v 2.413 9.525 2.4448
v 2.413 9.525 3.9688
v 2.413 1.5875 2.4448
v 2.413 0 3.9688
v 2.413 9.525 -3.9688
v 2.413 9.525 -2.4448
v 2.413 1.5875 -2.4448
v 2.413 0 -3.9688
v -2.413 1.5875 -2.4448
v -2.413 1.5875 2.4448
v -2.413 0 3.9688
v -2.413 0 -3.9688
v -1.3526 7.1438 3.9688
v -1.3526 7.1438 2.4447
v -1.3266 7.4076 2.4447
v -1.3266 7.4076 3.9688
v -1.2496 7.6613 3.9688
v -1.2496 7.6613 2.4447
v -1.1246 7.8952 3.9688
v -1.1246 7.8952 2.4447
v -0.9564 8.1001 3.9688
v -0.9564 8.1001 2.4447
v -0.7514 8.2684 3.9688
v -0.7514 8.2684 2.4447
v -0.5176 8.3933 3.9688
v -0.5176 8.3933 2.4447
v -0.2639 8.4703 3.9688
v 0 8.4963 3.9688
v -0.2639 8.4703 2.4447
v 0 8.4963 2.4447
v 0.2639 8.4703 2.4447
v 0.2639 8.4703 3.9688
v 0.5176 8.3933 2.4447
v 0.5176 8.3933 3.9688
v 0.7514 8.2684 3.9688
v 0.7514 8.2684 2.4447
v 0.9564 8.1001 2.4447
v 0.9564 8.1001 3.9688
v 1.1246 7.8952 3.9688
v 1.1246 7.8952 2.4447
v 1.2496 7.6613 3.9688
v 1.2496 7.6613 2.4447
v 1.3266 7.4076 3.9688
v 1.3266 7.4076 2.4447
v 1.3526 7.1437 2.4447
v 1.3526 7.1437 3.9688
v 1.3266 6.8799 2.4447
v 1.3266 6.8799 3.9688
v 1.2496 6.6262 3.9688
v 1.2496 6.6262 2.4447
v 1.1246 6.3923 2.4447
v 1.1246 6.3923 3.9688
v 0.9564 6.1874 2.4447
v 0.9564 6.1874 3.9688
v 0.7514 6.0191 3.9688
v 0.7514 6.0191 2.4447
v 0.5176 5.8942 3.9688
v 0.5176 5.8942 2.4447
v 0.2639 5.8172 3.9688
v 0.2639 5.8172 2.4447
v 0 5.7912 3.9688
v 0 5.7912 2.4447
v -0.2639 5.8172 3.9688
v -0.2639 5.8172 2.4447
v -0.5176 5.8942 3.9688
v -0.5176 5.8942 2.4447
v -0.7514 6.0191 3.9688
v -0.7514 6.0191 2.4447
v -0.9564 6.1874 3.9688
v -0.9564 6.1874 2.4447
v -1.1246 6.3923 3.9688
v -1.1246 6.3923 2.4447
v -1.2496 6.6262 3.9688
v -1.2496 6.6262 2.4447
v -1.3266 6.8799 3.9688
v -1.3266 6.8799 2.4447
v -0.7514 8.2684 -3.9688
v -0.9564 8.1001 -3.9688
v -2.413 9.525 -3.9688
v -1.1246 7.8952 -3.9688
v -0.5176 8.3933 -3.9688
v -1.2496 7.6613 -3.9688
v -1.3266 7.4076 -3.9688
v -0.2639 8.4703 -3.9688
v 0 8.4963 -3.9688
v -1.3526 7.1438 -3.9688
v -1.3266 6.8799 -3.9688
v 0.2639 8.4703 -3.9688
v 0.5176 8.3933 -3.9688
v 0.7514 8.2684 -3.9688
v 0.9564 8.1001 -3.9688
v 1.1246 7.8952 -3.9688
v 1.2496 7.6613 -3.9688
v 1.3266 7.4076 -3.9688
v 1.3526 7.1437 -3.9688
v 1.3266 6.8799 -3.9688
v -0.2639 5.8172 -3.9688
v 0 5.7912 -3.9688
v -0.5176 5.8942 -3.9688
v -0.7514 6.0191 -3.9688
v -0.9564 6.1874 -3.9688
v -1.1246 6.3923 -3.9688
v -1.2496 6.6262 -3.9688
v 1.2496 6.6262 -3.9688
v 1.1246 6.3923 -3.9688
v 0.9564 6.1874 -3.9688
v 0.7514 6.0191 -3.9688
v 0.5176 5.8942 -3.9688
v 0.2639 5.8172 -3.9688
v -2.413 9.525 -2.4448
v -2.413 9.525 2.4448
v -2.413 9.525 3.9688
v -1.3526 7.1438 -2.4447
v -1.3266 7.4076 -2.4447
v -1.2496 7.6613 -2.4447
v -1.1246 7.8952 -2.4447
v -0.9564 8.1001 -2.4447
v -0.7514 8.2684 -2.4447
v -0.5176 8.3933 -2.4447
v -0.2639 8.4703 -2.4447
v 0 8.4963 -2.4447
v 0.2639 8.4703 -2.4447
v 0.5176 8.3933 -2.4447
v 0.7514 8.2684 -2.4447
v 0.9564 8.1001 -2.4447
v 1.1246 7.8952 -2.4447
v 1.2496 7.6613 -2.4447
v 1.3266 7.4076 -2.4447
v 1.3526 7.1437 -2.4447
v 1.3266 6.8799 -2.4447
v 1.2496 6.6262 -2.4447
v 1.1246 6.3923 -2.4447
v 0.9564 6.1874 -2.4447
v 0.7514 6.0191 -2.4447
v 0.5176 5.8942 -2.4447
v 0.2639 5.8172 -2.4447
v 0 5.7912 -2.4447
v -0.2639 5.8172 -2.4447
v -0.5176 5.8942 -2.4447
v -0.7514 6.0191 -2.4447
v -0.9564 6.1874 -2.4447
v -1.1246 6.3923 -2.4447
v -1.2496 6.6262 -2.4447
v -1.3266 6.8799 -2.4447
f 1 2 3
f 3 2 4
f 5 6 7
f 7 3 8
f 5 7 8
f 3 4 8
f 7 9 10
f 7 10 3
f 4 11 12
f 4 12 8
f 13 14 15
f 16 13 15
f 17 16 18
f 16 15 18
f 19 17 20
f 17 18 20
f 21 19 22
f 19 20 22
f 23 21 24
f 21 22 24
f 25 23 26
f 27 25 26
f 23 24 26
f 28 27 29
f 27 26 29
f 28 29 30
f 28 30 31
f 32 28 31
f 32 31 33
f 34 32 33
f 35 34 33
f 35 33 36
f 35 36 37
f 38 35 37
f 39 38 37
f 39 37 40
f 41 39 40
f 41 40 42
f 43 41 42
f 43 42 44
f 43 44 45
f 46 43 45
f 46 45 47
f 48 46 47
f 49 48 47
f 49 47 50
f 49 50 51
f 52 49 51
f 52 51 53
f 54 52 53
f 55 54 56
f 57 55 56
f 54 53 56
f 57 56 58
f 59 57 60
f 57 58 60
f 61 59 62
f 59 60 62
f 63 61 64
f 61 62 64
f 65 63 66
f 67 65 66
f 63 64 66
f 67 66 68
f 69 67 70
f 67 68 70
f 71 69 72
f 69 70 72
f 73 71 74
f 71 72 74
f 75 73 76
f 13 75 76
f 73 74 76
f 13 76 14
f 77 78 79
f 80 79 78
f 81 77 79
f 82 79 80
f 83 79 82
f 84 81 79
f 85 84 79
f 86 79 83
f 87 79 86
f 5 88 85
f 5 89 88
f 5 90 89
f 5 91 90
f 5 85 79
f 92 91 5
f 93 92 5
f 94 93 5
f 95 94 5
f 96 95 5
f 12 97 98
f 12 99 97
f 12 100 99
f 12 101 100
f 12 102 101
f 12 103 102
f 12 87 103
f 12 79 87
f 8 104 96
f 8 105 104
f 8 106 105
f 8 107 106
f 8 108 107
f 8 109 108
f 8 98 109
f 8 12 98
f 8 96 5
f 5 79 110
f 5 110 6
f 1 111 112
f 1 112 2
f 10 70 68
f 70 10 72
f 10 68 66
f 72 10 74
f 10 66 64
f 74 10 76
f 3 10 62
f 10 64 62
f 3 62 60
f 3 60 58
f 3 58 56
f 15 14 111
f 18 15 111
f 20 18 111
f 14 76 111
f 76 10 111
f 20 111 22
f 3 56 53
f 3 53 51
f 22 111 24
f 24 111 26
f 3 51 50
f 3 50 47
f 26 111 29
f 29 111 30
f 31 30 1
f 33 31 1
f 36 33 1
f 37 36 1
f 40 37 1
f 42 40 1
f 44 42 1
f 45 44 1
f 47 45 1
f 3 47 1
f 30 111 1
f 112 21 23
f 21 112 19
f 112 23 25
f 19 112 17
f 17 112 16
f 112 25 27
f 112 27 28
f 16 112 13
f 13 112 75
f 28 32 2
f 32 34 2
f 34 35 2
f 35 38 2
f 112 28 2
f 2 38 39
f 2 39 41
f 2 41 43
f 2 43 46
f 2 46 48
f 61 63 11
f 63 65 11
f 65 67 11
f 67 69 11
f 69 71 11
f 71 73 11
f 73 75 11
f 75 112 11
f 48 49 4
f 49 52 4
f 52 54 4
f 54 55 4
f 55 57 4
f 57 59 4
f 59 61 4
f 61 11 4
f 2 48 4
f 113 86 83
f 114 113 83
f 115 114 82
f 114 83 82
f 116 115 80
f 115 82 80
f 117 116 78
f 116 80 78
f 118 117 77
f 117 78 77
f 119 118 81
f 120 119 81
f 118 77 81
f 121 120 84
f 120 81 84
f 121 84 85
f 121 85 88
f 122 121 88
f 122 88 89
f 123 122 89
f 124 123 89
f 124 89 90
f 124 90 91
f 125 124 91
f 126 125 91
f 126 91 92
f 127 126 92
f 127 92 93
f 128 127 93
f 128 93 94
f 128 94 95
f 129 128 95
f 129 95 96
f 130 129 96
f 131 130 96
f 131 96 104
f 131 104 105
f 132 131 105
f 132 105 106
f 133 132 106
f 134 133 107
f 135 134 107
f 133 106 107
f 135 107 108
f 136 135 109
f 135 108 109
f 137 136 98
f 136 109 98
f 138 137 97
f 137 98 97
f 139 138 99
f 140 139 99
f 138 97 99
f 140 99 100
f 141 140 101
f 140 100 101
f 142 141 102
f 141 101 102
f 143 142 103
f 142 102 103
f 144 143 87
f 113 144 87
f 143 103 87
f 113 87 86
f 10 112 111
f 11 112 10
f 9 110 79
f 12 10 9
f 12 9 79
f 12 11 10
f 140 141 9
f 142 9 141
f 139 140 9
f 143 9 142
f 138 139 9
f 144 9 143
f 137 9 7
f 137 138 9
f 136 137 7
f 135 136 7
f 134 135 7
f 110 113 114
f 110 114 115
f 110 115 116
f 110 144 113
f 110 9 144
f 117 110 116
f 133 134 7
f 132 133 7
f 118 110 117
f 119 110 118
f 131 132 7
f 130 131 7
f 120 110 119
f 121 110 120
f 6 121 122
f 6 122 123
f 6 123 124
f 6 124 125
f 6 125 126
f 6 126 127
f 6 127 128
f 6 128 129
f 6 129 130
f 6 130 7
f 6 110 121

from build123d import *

# Parameters (mm, degrees)
SKETCH1_W                 = 4.826
SKETCH1_H                 = 7.9375
BOSS_EXTRUDE1_DEPTH       = 9.525
SKETCH2_W                 = 4.826
SKETCH2_H                 = 4.8895
CUT_EXTRUDE1_DEPTH        = 7.9375
F_6_32_TAPPED_HOLE1_D     = 2.7051
F_6_32_TAPPED_HOLE1_DEPTH = 9.398


with BuildPart() as part:
    # Sketch1 → Boss-Extrude1 (new body)
    with BuildSketch(Plane(origin=(0, 0, 0), x_dir=(1, 0, 0), z_dir=(0, 1, 0))):
        Rectangle(SKETCH1_W, SKETCH1_H)
    extrude(amount=BOSS_EXTRUDE1_DEPTH)

    # Sketch2 → Cut-Extrude1 (cut)
    with BuildSketch(Plane(origin=(0, 9.525, 0), x_dir=(1, 0, 0), z_dir=(0, 1, 0))):
        Rectangle(SKETCH2_W, SKETCH2_H)
    extrude(amount=-CUT_EXTRUDE1_DEPTH, mode=Mode.SUBTRACT)

    # #6-32 Tapped Hole1
    with Locations(Plane.XY.offset(3.96875)):
        with Locations((0, 7.14375)):
            Hole(F_6_32_TAPPED_HOLE1_D / 2, depth=F_6_32_TAPPED_HOLE1_DEPTH)


solid = part.part
